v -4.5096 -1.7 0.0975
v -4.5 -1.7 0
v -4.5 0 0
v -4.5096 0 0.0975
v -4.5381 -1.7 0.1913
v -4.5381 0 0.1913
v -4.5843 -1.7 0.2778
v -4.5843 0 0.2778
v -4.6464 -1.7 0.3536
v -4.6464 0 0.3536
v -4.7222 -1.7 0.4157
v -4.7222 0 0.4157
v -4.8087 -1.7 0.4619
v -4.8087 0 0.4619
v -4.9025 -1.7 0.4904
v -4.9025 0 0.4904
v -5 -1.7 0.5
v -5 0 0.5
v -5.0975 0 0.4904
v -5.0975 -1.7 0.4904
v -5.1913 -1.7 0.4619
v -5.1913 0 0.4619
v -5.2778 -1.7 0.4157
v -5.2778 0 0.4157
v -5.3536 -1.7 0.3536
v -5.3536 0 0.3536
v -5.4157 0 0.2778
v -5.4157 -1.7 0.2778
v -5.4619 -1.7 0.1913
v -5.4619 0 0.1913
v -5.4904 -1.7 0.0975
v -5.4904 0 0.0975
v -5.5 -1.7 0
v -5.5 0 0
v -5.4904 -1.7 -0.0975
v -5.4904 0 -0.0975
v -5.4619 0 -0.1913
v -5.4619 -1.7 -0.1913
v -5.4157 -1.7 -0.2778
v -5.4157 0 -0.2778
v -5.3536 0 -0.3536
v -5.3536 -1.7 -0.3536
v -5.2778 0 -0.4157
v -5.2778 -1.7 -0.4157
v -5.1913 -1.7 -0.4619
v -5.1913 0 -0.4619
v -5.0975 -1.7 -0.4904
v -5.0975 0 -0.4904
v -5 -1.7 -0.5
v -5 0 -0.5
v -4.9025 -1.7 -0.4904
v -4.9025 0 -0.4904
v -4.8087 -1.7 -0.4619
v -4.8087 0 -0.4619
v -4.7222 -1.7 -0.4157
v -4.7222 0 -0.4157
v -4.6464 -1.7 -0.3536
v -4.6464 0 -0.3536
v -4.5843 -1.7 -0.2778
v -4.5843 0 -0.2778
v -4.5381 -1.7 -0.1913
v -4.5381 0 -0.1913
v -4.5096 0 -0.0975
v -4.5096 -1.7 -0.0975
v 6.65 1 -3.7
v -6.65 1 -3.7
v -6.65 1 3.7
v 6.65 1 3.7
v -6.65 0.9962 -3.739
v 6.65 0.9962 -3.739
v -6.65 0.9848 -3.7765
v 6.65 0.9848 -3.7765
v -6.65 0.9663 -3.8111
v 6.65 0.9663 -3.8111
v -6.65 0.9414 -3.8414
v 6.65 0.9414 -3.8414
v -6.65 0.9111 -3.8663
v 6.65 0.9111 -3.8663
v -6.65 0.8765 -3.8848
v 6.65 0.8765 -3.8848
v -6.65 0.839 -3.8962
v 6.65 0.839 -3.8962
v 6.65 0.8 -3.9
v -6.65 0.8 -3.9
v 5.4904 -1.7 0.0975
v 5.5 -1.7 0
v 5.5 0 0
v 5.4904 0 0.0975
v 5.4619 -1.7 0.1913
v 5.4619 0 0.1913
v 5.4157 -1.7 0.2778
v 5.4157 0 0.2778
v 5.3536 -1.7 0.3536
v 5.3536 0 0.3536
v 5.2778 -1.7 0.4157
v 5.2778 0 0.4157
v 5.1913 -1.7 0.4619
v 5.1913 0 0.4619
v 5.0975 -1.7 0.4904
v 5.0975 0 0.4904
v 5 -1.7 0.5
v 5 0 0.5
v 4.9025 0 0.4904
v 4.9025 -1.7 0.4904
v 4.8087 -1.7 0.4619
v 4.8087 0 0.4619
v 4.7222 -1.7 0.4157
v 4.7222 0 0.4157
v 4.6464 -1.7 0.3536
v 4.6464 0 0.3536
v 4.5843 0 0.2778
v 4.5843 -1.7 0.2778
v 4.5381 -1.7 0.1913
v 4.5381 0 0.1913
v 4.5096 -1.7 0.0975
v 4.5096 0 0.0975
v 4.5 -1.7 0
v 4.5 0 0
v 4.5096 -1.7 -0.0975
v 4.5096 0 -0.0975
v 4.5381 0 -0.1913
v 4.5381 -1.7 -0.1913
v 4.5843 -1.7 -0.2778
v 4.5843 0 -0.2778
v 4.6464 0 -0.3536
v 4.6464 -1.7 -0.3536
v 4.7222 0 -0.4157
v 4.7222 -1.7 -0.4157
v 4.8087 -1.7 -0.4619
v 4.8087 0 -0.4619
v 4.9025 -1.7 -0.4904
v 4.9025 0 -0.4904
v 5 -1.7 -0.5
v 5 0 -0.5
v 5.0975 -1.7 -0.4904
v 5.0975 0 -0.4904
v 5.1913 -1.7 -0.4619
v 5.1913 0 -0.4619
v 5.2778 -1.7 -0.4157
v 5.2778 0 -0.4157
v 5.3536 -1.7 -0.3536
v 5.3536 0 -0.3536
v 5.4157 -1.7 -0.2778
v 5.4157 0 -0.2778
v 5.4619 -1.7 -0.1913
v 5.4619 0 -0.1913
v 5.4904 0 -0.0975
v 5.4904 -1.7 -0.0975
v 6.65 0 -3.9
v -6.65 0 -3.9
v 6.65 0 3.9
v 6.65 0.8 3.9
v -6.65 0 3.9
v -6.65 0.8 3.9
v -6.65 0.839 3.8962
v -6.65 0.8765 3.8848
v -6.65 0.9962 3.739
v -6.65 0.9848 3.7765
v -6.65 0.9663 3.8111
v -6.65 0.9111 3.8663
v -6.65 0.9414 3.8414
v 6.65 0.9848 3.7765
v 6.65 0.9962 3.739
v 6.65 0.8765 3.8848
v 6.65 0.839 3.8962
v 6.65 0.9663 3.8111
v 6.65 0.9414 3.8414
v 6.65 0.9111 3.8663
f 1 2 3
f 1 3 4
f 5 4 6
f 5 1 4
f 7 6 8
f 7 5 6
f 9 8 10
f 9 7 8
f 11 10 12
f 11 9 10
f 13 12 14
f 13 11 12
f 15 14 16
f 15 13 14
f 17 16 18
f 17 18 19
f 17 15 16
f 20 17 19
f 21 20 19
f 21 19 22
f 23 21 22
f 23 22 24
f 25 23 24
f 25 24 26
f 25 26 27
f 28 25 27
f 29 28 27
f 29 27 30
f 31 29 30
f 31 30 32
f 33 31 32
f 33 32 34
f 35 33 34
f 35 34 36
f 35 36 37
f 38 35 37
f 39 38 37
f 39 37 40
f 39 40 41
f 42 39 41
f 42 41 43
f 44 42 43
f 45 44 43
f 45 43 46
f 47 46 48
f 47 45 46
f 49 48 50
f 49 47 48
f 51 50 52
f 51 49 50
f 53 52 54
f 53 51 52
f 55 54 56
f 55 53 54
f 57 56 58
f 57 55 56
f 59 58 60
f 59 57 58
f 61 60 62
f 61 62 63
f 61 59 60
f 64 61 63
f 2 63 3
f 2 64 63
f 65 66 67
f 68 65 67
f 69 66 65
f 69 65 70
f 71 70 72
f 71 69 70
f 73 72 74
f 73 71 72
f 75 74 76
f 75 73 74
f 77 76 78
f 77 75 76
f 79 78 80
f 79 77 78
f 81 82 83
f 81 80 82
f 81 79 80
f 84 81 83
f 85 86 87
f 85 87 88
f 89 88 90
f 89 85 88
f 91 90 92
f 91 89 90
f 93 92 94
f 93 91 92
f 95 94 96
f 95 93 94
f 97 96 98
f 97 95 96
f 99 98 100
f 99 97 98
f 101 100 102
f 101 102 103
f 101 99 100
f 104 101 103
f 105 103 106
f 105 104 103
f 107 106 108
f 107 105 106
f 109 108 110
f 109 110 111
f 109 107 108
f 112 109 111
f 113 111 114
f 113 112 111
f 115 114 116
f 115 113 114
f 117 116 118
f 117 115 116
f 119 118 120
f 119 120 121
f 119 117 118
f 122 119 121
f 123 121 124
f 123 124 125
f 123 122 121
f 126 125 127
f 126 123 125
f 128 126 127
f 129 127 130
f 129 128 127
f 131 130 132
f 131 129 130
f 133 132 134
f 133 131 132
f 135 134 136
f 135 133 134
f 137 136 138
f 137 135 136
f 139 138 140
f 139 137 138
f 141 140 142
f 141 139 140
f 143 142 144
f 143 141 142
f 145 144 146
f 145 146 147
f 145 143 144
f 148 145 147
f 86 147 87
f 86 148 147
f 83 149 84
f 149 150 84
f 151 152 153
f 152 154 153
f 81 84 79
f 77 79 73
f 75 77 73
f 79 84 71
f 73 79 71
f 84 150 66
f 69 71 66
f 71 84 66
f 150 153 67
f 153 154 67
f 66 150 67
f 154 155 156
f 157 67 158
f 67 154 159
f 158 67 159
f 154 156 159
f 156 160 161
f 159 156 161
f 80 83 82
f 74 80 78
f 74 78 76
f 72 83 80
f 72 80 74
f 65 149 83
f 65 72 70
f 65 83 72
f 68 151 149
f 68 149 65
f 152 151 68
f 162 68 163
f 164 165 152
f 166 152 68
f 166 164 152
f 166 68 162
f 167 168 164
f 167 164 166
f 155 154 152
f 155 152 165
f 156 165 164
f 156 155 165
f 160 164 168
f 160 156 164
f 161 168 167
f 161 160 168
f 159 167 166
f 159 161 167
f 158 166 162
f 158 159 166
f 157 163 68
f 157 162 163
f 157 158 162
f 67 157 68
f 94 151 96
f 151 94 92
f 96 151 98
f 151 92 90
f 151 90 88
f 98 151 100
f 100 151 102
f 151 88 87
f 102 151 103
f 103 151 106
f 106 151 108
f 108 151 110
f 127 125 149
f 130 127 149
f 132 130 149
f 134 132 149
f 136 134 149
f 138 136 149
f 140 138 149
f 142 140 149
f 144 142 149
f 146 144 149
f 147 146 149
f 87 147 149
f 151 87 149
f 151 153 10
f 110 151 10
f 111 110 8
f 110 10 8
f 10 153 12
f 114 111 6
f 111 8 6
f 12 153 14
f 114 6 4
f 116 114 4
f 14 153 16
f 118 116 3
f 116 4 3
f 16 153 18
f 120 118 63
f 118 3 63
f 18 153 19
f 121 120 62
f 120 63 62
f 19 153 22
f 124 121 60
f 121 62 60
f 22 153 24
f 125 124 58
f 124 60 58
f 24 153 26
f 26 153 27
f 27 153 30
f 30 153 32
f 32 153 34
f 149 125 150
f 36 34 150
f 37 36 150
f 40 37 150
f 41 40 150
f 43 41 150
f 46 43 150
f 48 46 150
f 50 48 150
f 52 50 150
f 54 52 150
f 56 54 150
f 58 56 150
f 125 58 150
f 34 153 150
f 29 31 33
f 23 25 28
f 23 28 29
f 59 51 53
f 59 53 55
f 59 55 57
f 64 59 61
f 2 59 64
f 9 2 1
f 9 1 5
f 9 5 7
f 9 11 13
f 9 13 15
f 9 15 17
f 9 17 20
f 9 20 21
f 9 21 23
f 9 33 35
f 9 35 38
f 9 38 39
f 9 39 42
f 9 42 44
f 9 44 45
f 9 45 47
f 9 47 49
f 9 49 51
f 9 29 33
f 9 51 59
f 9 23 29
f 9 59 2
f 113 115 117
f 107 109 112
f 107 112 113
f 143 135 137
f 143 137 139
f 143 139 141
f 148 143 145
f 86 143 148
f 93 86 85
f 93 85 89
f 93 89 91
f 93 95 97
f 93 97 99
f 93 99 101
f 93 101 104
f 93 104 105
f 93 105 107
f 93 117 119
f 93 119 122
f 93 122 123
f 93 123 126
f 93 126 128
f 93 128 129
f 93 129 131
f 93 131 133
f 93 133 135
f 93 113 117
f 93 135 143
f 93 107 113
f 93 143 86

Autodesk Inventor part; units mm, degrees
sketch "Sketch_1" plane through (0, 0, 0) normal (1, 0, 0) x (0, 1, 0)
  line L0 (0.8, 3.9) -> (0, 3.9)
  line L1 (0, 3.9) -> (0, -3.9)
  line L2 (0, -3.9) -> (0.8, -3.9)
  arc A0 (0.8, -3.9) -> (1, -3.7) centre (0.8, -3.7) ccw
  line L3 (1, -3.7) -> (1, 3.7)
  arc A1 (1, 3.7) -> (0.8, 3.9) centre (0.8, 3.7) ccw
extrude "Extrusion1" add sketch "Sketch_1" along normal mid plane 13.3
sketch "Sketch_2" plane through (0, 0, 0) normal (0, 0, 1) x (1, 0, 0)
  line L0 (5, -1.7) -> (5, 0)
  line L1 (5, 0) -> (5.5, 0)
  line L2 (5.5, 0) -> (5.5, -1.7)
  line L3 (5.5, -1.7) -> (5, -1.7)
  line L4 (5, -1.7) -> (5, 0)
revolve "Revolution1" add sketch "Sketch_2" angle 360 about axis through (5, -1.7, 0) along (0, -1, 0)
sketch "Sketch_3" plane through (0, 0, 0) normal (0, 0, 1) x (1, 0, 0)
  line L0 (-5, -1.7) -> (-5, 0)
  line L1 (-5, 0) -> (-4.5, 0)
  line L2 (-4.5, 0) -> (-4.5, -1.7)
  line L3 (-4.5, -1.7) -> (-5, -1.7)
  line L4 (-5, -1.7) -> (-5, 0)
revolve "Revolution2" add sketch "Sketch_3" angle 360 about axis through (-5, -1.7, 0) along (0, -1, 0)
ref_plane "mitCover_XY" through (0, 0, 0) normal (0, 1, 0) x (1, 0, 0)
ref_plane "mitCover_YZ" through (0, 0, 0) normal (1, 0, 0) x (0, 0, -1)
ref_plane "mitCover_ZX" through (0, 0, 0) normal (0, 0, -1) x (0, 1, 0)
properties part number "ESG 8x13.5 1912130000"
